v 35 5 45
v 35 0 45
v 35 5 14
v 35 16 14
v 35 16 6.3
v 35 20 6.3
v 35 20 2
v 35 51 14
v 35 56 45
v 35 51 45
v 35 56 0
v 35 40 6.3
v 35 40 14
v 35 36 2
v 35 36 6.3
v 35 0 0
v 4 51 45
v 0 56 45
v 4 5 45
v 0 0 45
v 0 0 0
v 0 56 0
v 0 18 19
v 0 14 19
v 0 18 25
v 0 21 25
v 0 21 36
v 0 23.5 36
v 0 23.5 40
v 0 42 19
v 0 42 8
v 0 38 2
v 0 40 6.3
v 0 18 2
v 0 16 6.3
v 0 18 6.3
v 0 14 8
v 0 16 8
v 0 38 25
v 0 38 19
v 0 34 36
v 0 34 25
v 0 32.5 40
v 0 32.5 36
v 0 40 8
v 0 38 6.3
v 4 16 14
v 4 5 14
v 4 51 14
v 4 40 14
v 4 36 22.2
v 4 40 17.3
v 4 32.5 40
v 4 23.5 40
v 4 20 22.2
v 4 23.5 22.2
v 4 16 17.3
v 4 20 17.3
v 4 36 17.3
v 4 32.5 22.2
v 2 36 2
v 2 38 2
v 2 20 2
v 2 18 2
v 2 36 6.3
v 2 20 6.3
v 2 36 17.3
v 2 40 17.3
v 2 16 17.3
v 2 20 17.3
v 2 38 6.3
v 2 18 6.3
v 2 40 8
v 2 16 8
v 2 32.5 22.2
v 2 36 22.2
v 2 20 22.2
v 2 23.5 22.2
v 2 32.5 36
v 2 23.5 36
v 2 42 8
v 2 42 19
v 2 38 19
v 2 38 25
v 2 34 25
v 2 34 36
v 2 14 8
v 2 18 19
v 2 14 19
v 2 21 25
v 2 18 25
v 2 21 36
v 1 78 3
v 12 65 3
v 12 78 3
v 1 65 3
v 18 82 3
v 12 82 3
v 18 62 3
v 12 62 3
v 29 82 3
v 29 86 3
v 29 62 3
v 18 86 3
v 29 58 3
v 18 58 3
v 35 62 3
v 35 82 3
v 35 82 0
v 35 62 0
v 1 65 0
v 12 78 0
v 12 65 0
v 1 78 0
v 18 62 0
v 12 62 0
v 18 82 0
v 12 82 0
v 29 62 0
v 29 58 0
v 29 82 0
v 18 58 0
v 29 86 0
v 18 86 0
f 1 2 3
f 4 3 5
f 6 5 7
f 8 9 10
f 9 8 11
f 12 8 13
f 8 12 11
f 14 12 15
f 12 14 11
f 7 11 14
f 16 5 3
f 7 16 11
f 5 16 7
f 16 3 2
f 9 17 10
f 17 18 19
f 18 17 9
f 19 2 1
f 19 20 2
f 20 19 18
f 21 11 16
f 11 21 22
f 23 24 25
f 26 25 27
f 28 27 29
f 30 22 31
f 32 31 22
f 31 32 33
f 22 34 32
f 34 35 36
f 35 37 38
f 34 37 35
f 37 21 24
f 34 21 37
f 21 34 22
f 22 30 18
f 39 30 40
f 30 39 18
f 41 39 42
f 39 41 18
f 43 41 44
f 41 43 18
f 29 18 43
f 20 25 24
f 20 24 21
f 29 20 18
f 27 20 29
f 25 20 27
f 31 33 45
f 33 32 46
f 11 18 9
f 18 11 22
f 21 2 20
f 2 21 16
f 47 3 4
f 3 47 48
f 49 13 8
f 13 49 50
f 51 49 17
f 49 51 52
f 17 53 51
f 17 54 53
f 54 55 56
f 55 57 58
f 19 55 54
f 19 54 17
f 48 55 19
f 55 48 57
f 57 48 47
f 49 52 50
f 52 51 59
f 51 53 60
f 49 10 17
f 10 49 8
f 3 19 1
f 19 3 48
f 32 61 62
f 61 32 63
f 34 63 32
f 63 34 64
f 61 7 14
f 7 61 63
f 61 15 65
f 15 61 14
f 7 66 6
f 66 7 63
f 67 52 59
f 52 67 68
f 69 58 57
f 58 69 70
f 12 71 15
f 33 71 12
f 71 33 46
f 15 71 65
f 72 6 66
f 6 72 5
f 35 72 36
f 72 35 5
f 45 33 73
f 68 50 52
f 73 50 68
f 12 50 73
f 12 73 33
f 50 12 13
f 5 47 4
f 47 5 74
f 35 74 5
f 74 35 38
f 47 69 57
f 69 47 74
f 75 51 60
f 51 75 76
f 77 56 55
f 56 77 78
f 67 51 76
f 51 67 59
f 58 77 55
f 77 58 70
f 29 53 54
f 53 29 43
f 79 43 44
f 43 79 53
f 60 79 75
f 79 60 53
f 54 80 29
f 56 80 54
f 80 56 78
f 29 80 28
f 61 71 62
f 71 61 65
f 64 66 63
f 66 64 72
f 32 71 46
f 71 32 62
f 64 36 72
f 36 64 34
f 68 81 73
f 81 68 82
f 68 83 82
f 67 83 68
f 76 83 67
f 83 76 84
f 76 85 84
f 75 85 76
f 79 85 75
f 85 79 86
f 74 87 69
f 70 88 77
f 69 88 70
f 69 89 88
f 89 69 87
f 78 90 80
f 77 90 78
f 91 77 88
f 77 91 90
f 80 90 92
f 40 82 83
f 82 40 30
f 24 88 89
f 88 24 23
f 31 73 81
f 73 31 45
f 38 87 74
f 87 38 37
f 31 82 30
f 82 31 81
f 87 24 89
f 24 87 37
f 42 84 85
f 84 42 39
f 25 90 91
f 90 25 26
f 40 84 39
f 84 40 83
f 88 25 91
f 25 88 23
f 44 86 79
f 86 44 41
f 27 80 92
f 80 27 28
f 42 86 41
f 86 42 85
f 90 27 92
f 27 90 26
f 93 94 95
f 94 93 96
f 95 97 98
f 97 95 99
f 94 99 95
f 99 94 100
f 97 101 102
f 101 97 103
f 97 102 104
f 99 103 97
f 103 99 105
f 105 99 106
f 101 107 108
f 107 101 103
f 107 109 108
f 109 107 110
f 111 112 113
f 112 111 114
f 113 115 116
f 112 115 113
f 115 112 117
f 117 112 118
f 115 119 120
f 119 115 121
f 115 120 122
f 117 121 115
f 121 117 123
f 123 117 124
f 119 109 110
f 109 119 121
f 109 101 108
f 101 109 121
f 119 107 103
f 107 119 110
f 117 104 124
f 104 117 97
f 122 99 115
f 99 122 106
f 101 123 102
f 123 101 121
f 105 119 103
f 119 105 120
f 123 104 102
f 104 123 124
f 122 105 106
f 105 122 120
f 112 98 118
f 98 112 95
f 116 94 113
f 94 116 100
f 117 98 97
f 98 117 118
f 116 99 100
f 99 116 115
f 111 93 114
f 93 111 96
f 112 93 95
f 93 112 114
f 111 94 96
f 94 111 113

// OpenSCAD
difference()
{
	cube([35,56,45]);
	translate([4,5,14]) cube([86,46,55]);
	translate([1.5,2.5,63]) cube([91,51,3]);
	translate([3.7,22.5,54]) cube([1,11,11]);
	translate([89,22.5,54]) cube([1,11,11]);	
	translate([-1,20,2]) cube([40,16,7]);
	translate([-1,16,6.3]) cube([40,24,11]);
	translate([-1,20,15.2]) cube([40,16,7]);
	translate([-1,23.5,22]) cube([40,9,18]);
	translate([-1,18,2]) cube([3,20,7]);
	translate([-1,14,8]) cube([3,28,11]);
	translate([-1,18,18]) cube([3,20,7]);
	translate([-1,21,24]) cube([3,13,12]);	
}

translate ([35,44,0])
rotate([0,-90,0])
union()
{
	translate([0,18,0]) cube([3,20,7]);
	translate([0,14,6]) cube([3,28,11]);
	translate([0,18,16]) cube([3,20,7]);
	translate([0,21,22]) cube([3,13,12]);
}
